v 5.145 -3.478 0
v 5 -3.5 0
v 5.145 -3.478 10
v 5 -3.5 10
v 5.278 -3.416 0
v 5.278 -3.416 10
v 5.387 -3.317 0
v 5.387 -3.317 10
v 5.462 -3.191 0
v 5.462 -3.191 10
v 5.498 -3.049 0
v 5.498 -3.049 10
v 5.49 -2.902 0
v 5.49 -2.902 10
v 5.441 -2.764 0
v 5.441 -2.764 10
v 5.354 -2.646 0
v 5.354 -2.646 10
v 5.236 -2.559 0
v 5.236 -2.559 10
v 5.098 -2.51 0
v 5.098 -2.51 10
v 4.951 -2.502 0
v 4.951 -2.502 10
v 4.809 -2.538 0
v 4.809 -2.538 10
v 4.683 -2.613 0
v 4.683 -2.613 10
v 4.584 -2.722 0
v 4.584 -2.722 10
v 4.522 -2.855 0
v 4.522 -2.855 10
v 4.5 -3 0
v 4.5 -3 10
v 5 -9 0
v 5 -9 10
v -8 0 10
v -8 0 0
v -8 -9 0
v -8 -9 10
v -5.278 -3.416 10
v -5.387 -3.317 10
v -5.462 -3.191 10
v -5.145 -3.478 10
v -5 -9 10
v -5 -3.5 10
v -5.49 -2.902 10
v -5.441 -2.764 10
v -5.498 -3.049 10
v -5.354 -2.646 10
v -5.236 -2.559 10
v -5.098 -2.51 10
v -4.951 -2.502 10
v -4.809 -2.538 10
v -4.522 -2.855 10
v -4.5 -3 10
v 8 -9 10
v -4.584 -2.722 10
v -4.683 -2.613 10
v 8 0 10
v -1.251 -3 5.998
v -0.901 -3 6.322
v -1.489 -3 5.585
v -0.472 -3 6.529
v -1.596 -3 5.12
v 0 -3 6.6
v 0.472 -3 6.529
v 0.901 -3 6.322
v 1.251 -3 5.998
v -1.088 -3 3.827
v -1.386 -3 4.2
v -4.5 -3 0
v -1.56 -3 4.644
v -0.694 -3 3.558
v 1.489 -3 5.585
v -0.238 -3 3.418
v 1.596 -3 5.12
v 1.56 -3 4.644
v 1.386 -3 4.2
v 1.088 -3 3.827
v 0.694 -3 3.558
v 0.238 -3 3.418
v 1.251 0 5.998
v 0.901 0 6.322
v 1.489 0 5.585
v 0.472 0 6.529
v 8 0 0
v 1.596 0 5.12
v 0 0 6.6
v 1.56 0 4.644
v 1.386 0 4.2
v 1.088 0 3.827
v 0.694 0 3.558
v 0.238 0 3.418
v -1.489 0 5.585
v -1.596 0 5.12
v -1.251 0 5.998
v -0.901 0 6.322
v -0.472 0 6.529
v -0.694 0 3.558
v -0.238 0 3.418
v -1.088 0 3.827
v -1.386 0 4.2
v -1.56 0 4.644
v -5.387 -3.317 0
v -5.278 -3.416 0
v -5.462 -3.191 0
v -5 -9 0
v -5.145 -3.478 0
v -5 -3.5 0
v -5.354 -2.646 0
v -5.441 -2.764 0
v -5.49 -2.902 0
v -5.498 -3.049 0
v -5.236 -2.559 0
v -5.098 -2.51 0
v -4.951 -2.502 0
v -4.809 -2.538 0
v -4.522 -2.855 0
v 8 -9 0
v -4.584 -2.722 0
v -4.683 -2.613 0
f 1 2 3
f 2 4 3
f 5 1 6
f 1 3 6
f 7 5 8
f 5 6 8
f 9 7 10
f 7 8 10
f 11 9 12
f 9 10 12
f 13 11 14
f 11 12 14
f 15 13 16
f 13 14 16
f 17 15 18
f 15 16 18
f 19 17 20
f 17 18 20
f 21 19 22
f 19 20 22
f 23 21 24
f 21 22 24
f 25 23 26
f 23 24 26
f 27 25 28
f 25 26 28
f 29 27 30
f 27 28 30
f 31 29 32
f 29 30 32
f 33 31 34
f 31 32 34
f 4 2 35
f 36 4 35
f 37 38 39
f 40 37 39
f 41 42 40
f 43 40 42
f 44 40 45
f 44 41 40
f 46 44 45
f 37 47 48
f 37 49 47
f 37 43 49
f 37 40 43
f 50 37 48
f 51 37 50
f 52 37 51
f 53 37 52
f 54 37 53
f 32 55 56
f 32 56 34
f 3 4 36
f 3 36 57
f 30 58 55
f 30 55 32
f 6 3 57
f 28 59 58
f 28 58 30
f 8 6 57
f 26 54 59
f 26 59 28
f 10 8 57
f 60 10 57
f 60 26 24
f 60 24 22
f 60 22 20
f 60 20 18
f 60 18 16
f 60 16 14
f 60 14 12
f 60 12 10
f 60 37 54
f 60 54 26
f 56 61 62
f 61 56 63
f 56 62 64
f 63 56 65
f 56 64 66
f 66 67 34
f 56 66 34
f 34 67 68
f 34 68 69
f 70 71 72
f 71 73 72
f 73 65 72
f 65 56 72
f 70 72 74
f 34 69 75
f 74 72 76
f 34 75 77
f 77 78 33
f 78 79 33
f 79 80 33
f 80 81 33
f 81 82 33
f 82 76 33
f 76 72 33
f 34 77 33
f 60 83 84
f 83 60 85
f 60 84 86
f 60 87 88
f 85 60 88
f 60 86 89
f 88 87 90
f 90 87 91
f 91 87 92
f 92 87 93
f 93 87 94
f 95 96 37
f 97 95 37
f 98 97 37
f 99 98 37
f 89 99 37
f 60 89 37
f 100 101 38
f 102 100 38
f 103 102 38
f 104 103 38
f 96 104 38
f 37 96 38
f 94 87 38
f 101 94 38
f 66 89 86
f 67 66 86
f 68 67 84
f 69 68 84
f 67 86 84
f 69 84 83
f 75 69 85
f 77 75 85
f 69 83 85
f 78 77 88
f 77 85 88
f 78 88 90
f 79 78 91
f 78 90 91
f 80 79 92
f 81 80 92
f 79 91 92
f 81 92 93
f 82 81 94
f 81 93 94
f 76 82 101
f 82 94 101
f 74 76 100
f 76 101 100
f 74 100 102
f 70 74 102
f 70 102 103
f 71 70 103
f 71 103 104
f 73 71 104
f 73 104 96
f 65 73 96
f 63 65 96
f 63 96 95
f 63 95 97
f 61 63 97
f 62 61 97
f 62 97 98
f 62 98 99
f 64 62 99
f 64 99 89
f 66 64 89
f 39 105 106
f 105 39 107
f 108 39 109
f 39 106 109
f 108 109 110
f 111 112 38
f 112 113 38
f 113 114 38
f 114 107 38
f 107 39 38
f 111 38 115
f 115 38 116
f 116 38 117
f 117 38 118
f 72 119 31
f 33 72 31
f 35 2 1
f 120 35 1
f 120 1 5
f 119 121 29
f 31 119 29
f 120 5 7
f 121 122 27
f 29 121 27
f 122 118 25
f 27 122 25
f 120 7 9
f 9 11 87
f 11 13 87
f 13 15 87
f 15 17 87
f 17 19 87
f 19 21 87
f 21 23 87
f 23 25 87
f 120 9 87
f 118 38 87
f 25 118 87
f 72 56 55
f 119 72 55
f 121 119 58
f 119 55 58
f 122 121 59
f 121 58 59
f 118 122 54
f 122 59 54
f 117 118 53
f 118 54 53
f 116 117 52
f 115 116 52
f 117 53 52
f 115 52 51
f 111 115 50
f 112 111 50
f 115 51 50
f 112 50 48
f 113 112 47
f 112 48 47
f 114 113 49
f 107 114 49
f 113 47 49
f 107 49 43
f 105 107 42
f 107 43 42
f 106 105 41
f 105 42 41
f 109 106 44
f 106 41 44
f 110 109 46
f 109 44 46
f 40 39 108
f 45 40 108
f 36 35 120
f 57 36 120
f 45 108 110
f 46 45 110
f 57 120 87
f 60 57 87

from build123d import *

# Parameters (mm, degrees)
EXTRUDE_1_DEPTH     = 10
SKETCH_2_R          = 1.6
CUT_EXTRUDE_1_DEPTH = 16.652475842
SKETCH_5_R          = 0.5
CUT_EXTRUDE_2_DEPTH = 16.652475842


with BuildPart() as part:
    # 草图1 → 凸台-拉伸1 (new body)
    with BuildSketch(Plane.XY):
        Polygon((0, 0), (-8, 0), (-8, -9), (-5, -9), (-5, -3), (5, -3), (5, -9), (8, -9), (8, 0), align=None)
    extrude(amount=EXTRUDE_1_DEPTH)

    # 草图2 → 切除-拉伸1 (cut, through all)
    with BuildSketch(Plane(origin=(0, 0, 0), x_dir=(1, 0, 0), z_dir=(0, 1, 0))):
        with Locations(Location((0, -5, 0), (0, 0, 270))):
            Circle(SKETCH_2_R)
    extrude(amount=-CUT_EXTRUDE_1_DEPTH, mode=Mode.SUBTRACT)

    # 草图5 → 切除-拉伸2 (cut, through all)
    with BuildSketch(Plane.XY.offset(10)):
        with Locations((-5, -3)):
            Circle(SKETCH_5_R)
        with Locations((5, -3)):
            Circle(SKETCH_5_R)
    extrude(amount=-CUT_EXTRUDE_2_DEPTH, mode=Mode.SUBTRACT)


solid = part.part
